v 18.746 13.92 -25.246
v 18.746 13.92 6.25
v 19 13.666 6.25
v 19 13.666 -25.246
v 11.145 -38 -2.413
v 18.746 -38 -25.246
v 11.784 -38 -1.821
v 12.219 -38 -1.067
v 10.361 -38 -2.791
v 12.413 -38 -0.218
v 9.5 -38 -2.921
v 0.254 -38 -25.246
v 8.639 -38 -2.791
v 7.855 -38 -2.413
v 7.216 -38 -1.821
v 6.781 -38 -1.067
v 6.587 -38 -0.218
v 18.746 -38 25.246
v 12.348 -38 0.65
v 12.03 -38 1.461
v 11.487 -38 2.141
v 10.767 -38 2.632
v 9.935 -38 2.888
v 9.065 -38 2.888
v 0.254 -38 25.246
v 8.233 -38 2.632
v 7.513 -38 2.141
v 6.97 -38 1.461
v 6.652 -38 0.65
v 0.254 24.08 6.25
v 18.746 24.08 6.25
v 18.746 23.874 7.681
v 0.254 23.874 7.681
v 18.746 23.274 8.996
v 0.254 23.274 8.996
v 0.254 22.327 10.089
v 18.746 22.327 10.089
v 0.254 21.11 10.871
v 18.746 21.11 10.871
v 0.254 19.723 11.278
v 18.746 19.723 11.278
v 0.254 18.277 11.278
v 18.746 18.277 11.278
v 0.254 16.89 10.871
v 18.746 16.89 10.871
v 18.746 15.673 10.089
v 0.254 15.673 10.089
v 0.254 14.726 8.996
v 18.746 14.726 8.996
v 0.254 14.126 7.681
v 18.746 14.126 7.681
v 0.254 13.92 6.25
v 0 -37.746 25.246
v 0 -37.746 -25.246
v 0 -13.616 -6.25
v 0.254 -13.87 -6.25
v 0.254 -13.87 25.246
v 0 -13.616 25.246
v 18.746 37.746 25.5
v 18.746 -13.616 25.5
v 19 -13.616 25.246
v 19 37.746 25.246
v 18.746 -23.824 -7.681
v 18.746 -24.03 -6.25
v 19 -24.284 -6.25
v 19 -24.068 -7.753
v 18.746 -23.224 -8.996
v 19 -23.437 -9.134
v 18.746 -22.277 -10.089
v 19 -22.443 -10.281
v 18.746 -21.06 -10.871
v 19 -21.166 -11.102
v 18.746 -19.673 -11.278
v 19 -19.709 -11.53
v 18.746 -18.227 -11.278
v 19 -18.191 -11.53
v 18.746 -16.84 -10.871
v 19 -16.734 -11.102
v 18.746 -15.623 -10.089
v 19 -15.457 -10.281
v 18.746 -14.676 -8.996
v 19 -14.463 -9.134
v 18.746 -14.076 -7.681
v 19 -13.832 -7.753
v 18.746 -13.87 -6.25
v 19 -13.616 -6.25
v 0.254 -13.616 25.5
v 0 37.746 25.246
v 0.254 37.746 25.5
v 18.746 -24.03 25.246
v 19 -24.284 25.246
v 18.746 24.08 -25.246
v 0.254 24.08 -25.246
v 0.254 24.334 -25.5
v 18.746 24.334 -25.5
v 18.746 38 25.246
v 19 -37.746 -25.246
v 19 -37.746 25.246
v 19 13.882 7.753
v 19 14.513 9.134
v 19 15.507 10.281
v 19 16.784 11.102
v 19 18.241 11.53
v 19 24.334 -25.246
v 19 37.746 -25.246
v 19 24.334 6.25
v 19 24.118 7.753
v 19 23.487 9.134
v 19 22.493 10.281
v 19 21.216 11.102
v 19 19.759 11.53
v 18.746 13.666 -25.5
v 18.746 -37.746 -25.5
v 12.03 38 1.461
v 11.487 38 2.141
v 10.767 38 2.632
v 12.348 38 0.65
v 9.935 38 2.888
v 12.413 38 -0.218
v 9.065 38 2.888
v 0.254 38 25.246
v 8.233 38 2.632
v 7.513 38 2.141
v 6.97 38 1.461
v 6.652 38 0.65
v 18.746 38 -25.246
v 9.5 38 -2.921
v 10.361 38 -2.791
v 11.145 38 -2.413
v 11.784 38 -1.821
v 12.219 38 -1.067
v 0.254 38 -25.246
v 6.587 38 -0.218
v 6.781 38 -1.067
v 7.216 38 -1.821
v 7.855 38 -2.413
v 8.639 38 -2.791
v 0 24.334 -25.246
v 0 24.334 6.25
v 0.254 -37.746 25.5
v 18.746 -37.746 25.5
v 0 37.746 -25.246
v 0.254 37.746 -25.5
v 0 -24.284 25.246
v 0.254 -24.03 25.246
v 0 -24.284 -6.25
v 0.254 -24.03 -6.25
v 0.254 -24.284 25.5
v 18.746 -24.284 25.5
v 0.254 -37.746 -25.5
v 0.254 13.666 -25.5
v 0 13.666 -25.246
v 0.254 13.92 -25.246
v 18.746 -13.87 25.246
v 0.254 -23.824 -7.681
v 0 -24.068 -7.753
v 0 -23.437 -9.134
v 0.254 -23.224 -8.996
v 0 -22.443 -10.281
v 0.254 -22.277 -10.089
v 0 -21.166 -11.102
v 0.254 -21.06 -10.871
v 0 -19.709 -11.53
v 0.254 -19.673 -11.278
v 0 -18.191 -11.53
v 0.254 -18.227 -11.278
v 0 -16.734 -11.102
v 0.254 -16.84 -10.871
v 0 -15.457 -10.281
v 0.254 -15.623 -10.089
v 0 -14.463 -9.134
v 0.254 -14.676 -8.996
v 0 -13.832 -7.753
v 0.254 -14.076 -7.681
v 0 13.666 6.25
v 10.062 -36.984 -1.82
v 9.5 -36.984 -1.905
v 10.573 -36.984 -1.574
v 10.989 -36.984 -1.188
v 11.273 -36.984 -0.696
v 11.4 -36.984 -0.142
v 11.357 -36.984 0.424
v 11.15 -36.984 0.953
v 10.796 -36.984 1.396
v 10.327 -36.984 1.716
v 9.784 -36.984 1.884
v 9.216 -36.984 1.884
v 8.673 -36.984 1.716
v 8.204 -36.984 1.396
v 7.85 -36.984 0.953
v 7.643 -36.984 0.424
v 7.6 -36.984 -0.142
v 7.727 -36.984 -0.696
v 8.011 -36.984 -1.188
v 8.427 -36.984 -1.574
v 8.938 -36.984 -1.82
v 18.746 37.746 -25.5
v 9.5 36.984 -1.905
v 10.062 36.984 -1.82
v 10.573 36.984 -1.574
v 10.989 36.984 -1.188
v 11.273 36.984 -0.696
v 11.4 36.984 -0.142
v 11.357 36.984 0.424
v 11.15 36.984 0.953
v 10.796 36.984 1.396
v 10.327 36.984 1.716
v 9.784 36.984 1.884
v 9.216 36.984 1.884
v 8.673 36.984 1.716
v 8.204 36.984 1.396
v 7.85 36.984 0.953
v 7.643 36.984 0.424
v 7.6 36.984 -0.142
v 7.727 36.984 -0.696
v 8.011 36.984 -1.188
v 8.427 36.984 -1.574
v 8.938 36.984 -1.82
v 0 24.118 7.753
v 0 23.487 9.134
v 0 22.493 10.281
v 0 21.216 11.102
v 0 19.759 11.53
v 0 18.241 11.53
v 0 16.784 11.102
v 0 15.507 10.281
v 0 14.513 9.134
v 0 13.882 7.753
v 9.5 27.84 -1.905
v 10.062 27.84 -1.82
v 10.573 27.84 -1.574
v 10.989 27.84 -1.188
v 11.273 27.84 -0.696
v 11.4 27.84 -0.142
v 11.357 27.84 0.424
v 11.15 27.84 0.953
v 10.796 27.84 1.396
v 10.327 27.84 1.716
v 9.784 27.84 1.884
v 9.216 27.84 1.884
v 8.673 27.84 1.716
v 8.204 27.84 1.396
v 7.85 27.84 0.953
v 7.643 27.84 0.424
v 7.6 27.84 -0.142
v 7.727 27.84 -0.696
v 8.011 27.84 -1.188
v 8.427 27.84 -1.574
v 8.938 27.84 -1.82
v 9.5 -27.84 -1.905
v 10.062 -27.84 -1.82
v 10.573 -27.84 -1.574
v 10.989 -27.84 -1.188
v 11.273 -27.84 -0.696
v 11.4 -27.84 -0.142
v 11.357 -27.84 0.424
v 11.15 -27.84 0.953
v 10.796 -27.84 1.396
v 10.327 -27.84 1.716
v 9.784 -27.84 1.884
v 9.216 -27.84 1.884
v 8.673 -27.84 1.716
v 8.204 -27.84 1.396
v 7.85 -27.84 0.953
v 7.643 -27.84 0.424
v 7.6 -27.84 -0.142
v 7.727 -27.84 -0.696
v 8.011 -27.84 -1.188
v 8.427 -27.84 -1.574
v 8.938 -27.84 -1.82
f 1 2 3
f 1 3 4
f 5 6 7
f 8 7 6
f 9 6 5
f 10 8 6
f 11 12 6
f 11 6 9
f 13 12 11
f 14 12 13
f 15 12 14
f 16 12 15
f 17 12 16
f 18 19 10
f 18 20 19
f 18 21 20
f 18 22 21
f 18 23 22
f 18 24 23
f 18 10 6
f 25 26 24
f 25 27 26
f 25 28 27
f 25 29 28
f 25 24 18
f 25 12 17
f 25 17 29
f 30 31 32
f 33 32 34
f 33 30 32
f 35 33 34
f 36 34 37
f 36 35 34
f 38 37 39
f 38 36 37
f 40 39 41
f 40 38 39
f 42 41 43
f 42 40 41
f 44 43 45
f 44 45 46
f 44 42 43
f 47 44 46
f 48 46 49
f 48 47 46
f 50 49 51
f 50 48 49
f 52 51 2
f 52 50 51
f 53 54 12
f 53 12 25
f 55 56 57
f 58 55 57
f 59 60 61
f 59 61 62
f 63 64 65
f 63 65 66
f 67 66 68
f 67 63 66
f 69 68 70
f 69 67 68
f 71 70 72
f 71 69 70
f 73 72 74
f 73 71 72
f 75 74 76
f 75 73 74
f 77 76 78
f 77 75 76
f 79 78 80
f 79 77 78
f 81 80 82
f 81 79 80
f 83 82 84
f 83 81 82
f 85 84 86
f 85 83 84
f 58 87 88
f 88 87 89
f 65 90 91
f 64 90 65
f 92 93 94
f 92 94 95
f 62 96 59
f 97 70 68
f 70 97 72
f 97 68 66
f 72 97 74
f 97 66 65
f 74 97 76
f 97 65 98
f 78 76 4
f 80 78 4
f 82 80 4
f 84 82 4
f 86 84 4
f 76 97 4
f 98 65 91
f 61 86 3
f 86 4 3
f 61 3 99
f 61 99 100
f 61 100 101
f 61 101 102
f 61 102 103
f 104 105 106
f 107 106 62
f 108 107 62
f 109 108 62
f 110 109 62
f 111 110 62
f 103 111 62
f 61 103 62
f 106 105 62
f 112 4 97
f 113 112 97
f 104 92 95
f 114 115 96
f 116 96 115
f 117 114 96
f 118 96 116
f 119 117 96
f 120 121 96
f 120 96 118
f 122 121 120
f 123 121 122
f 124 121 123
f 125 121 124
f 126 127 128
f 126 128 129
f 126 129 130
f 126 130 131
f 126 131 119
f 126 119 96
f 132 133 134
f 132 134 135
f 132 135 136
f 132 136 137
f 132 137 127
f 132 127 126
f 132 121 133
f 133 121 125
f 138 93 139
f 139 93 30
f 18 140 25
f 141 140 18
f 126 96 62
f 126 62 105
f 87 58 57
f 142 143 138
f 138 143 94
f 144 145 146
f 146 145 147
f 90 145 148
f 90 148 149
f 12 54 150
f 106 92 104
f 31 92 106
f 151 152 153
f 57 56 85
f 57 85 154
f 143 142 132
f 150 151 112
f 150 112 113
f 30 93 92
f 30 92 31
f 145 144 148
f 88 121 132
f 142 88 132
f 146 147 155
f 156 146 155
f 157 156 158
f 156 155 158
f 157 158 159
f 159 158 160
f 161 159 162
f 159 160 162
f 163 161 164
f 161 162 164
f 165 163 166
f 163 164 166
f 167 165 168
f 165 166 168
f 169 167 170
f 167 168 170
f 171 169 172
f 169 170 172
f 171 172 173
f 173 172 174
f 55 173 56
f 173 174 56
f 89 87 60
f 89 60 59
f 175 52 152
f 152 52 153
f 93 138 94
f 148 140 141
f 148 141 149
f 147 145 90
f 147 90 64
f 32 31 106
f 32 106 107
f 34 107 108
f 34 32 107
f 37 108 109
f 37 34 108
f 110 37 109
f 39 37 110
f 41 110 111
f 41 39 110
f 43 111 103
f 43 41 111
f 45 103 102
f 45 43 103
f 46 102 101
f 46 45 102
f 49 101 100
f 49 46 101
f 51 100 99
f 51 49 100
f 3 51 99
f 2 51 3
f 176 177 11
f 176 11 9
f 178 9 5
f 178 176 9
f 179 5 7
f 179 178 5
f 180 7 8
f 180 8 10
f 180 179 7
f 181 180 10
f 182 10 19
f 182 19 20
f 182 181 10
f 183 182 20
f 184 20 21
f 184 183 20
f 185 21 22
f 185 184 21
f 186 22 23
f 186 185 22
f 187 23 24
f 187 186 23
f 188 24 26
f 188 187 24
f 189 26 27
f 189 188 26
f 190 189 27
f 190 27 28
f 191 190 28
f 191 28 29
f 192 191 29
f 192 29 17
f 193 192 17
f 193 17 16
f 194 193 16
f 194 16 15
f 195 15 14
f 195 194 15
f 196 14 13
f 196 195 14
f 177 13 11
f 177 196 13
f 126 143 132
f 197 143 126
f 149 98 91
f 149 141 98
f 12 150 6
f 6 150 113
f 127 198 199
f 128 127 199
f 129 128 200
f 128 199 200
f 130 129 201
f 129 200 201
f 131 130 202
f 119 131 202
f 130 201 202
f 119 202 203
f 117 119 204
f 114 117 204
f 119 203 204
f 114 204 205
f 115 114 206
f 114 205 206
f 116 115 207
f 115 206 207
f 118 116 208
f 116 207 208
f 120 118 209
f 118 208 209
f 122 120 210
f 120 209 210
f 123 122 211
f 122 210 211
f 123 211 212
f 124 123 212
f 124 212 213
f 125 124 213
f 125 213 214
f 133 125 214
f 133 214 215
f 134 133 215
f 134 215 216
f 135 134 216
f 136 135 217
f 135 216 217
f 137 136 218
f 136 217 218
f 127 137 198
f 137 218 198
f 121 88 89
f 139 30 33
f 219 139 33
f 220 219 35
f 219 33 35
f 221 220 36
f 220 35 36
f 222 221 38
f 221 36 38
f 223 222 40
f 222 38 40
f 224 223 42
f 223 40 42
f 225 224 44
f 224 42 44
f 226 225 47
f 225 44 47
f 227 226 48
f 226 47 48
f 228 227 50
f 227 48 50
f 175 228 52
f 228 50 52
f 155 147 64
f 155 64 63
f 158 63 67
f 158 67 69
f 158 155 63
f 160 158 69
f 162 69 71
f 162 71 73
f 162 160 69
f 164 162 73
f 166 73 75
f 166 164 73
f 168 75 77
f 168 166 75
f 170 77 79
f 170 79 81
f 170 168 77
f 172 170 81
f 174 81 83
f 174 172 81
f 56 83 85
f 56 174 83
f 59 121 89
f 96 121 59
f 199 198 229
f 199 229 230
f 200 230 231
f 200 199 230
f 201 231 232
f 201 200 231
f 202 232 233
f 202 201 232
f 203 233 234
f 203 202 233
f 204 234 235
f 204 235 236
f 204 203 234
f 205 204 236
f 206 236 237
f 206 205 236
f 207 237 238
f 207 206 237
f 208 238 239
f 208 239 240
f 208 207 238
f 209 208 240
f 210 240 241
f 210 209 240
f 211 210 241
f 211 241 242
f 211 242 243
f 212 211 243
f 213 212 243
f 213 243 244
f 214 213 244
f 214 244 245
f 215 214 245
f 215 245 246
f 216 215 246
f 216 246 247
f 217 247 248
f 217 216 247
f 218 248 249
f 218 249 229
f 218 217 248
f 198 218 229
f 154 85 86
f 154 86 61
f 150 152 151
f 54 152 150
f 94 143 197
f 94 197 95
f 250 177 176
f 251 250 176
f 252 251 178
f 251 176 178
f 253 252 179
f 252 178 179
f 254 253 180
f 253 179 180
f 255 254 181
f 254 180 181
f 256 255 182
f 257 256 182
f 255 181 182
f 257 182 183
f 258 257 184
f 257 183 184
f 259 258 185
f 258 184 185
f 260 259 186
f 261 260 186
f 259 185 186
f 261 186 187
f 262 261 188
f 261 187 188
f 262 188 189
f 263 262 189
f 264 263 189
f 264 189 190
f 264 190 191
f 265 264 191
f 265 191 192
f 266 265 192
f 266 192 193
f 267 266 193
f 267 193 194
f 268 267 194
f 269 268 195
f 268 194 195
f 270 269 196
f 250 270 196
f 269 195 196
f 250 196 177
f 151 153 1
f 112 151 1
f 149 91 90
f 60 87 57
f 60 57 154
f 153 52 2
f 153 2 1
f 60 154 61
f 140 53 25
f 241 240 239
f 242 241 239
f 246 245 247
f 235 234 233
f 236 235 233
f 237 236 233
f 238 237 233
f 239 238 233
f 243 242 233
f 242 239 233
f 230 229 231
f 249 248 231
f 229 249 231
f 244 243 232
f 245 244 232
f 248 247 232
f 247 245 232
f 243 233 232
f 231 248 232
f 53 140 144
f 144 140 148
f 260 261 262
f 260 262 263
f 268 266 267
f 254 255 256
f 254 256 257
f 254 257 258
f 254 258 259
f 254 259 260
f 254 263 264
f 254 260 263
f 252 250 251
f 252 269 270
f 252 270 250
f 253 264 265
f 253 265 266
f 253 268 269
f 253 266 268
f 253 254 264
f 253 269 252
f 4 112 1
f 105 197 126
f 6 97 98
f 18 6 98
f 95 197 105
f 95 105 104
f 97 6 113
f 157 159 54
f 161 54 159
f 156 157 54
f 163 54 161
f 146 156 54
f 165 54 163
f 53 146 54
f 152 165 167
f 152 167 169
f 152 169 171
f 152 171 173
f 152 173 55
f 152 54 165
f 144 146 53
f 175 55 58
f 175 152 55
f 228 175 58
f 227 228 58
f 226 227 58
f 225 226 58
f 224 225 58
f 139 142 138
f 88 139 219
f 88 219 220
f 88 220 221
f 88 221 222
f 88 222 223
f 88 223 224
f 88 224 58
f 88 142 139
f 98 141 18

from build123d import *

# Parameters (mm, degrees)
BOSS_EXTRUDE1_DEPTH = 19
SKETCH2_R           = 1.905
CUT_EXTRUDE1_DEPTH  = 10.16
CHAMFER1_SIZE       = 1.016
CHAMFER2_SIZE       = 0.254
CHAMFER3_SIZE       = 1.016


with BuildPart() as part:
    # Sketch1 → Boss-Extrude1 (new body)
    with BuildSketch(Plane(origin=(0, 0, 0), x_dir=(0, 0, -1), z_dir=(1, 0, 0))):
        with BuildLine():
            Line((6.25, -13.87), (-25.5, -13.87))
            Line((-25.5, -13.87), (-25.5, 38))
            Line((-25.5, 38), (25.5, 38))
            Line((25.5, 38), (25.5, 24.08))
            Line((25.5, 24.08), (-6.25, 24.08))
            ThreePointArc((-6.25, 24.08), (-11.33, 19), (-6.25, 13.92))
            Line((-6.25, 13.92), (25.5, 13.92))
            Line((25.5, 13.92), (25.5, -38))
            Line((25.5, -38), (-25.5, -38))
            Line((-25.5, -38), (-25.5, -24.03))
            Line((-25.5, -24.03), (6.25, -24.03))
            ThreePointArc((6.25, -24.03), (11.33, -18.95), (6.25, -13.87))
        make_face()
    extrude(amount=BOSS_EXTRUDE1_DEPTH)

    # Sketch2 → Cut-Extrude1 (cut)
    with BuildSketch(Plane.XZ.offset(38)):
        with Locations(Location((9.5, 0, 0), (0, 0, 270))):
            Circle(SKETCH2_R)
    cut_extrude1 = extrude(amount=-CUT_EXTRUDE1_DEPTH, mode=Mode.SUBTRACT)

    # Chamfer1
    chamfer1_edges = [part.edges().sort_by_distance(p)[0] for p in [
        (9.5, -38, 1.905),
    ]]
    chamfer(chamfer1_edges, length=CHAMFER1_SIZE)

    # Chamfer2
    chamfer2_edges = [part.edges().sort_by_distance(p)[0] for p in [
        (19, -18.95, -11.33),
        (0, 12.065, 25.5),
        (0, 38, 0),
        (0, 31.04, -25.5),
        (0, 24.08, -9.625),
        (19, -24.03, 9.625),
        (0, 19, 11.33),
        (0, 13.92, -9.625),
        (0, -12.04, -25.5),
        (0, -38, 0),
        (0, -31.015, 25.5),
        (0, -24.03, 9.625),
        (0, -18.95, -11.33),
        (0, -13.87, 9.625),
        (19, -31.015, 25.5),
        (9.5, -13.87, 25.5),
        (9.5, 38, 25.5),
        (9.5, 38, -25.5),
        (9.5, 24.08, -25.5),
        (9.5, 13.92, -25.5),
        (9.5, -38, -25.5),
        (9.5, -38, 25.5),
        (9.5, -24.03, 25.5),
        (19, -38, 0),
        (19, -12.04, -25.5),
        (19, 13.92, -9.625),
        (19, 19, 11.33),
        (19, 24.08, -9.625),
        (19, 31.04, -25.5),
        (19, 38, 0),
        (19, -13.87, 9.625),
        (19, 12.065, 25.5),
    ]]
    chamfer(chamfer2_edges, length=CHAMFER2_SIZE)

    # Mirror3: Cut-Extrude1 across plane
    add(cut_extrude1.mirror(Plane.ZX), mode=Mode.SUBTRACT)

    # Chamfer3
    chamfer3_edges = [part.edges().sort_by_distance(p)[0] for p in [
        (9.5, 38, 1.905),
    ]]
    chamfer(chamfer3_edges, length=CHAMFER3_SIZE)


solid = part.part
